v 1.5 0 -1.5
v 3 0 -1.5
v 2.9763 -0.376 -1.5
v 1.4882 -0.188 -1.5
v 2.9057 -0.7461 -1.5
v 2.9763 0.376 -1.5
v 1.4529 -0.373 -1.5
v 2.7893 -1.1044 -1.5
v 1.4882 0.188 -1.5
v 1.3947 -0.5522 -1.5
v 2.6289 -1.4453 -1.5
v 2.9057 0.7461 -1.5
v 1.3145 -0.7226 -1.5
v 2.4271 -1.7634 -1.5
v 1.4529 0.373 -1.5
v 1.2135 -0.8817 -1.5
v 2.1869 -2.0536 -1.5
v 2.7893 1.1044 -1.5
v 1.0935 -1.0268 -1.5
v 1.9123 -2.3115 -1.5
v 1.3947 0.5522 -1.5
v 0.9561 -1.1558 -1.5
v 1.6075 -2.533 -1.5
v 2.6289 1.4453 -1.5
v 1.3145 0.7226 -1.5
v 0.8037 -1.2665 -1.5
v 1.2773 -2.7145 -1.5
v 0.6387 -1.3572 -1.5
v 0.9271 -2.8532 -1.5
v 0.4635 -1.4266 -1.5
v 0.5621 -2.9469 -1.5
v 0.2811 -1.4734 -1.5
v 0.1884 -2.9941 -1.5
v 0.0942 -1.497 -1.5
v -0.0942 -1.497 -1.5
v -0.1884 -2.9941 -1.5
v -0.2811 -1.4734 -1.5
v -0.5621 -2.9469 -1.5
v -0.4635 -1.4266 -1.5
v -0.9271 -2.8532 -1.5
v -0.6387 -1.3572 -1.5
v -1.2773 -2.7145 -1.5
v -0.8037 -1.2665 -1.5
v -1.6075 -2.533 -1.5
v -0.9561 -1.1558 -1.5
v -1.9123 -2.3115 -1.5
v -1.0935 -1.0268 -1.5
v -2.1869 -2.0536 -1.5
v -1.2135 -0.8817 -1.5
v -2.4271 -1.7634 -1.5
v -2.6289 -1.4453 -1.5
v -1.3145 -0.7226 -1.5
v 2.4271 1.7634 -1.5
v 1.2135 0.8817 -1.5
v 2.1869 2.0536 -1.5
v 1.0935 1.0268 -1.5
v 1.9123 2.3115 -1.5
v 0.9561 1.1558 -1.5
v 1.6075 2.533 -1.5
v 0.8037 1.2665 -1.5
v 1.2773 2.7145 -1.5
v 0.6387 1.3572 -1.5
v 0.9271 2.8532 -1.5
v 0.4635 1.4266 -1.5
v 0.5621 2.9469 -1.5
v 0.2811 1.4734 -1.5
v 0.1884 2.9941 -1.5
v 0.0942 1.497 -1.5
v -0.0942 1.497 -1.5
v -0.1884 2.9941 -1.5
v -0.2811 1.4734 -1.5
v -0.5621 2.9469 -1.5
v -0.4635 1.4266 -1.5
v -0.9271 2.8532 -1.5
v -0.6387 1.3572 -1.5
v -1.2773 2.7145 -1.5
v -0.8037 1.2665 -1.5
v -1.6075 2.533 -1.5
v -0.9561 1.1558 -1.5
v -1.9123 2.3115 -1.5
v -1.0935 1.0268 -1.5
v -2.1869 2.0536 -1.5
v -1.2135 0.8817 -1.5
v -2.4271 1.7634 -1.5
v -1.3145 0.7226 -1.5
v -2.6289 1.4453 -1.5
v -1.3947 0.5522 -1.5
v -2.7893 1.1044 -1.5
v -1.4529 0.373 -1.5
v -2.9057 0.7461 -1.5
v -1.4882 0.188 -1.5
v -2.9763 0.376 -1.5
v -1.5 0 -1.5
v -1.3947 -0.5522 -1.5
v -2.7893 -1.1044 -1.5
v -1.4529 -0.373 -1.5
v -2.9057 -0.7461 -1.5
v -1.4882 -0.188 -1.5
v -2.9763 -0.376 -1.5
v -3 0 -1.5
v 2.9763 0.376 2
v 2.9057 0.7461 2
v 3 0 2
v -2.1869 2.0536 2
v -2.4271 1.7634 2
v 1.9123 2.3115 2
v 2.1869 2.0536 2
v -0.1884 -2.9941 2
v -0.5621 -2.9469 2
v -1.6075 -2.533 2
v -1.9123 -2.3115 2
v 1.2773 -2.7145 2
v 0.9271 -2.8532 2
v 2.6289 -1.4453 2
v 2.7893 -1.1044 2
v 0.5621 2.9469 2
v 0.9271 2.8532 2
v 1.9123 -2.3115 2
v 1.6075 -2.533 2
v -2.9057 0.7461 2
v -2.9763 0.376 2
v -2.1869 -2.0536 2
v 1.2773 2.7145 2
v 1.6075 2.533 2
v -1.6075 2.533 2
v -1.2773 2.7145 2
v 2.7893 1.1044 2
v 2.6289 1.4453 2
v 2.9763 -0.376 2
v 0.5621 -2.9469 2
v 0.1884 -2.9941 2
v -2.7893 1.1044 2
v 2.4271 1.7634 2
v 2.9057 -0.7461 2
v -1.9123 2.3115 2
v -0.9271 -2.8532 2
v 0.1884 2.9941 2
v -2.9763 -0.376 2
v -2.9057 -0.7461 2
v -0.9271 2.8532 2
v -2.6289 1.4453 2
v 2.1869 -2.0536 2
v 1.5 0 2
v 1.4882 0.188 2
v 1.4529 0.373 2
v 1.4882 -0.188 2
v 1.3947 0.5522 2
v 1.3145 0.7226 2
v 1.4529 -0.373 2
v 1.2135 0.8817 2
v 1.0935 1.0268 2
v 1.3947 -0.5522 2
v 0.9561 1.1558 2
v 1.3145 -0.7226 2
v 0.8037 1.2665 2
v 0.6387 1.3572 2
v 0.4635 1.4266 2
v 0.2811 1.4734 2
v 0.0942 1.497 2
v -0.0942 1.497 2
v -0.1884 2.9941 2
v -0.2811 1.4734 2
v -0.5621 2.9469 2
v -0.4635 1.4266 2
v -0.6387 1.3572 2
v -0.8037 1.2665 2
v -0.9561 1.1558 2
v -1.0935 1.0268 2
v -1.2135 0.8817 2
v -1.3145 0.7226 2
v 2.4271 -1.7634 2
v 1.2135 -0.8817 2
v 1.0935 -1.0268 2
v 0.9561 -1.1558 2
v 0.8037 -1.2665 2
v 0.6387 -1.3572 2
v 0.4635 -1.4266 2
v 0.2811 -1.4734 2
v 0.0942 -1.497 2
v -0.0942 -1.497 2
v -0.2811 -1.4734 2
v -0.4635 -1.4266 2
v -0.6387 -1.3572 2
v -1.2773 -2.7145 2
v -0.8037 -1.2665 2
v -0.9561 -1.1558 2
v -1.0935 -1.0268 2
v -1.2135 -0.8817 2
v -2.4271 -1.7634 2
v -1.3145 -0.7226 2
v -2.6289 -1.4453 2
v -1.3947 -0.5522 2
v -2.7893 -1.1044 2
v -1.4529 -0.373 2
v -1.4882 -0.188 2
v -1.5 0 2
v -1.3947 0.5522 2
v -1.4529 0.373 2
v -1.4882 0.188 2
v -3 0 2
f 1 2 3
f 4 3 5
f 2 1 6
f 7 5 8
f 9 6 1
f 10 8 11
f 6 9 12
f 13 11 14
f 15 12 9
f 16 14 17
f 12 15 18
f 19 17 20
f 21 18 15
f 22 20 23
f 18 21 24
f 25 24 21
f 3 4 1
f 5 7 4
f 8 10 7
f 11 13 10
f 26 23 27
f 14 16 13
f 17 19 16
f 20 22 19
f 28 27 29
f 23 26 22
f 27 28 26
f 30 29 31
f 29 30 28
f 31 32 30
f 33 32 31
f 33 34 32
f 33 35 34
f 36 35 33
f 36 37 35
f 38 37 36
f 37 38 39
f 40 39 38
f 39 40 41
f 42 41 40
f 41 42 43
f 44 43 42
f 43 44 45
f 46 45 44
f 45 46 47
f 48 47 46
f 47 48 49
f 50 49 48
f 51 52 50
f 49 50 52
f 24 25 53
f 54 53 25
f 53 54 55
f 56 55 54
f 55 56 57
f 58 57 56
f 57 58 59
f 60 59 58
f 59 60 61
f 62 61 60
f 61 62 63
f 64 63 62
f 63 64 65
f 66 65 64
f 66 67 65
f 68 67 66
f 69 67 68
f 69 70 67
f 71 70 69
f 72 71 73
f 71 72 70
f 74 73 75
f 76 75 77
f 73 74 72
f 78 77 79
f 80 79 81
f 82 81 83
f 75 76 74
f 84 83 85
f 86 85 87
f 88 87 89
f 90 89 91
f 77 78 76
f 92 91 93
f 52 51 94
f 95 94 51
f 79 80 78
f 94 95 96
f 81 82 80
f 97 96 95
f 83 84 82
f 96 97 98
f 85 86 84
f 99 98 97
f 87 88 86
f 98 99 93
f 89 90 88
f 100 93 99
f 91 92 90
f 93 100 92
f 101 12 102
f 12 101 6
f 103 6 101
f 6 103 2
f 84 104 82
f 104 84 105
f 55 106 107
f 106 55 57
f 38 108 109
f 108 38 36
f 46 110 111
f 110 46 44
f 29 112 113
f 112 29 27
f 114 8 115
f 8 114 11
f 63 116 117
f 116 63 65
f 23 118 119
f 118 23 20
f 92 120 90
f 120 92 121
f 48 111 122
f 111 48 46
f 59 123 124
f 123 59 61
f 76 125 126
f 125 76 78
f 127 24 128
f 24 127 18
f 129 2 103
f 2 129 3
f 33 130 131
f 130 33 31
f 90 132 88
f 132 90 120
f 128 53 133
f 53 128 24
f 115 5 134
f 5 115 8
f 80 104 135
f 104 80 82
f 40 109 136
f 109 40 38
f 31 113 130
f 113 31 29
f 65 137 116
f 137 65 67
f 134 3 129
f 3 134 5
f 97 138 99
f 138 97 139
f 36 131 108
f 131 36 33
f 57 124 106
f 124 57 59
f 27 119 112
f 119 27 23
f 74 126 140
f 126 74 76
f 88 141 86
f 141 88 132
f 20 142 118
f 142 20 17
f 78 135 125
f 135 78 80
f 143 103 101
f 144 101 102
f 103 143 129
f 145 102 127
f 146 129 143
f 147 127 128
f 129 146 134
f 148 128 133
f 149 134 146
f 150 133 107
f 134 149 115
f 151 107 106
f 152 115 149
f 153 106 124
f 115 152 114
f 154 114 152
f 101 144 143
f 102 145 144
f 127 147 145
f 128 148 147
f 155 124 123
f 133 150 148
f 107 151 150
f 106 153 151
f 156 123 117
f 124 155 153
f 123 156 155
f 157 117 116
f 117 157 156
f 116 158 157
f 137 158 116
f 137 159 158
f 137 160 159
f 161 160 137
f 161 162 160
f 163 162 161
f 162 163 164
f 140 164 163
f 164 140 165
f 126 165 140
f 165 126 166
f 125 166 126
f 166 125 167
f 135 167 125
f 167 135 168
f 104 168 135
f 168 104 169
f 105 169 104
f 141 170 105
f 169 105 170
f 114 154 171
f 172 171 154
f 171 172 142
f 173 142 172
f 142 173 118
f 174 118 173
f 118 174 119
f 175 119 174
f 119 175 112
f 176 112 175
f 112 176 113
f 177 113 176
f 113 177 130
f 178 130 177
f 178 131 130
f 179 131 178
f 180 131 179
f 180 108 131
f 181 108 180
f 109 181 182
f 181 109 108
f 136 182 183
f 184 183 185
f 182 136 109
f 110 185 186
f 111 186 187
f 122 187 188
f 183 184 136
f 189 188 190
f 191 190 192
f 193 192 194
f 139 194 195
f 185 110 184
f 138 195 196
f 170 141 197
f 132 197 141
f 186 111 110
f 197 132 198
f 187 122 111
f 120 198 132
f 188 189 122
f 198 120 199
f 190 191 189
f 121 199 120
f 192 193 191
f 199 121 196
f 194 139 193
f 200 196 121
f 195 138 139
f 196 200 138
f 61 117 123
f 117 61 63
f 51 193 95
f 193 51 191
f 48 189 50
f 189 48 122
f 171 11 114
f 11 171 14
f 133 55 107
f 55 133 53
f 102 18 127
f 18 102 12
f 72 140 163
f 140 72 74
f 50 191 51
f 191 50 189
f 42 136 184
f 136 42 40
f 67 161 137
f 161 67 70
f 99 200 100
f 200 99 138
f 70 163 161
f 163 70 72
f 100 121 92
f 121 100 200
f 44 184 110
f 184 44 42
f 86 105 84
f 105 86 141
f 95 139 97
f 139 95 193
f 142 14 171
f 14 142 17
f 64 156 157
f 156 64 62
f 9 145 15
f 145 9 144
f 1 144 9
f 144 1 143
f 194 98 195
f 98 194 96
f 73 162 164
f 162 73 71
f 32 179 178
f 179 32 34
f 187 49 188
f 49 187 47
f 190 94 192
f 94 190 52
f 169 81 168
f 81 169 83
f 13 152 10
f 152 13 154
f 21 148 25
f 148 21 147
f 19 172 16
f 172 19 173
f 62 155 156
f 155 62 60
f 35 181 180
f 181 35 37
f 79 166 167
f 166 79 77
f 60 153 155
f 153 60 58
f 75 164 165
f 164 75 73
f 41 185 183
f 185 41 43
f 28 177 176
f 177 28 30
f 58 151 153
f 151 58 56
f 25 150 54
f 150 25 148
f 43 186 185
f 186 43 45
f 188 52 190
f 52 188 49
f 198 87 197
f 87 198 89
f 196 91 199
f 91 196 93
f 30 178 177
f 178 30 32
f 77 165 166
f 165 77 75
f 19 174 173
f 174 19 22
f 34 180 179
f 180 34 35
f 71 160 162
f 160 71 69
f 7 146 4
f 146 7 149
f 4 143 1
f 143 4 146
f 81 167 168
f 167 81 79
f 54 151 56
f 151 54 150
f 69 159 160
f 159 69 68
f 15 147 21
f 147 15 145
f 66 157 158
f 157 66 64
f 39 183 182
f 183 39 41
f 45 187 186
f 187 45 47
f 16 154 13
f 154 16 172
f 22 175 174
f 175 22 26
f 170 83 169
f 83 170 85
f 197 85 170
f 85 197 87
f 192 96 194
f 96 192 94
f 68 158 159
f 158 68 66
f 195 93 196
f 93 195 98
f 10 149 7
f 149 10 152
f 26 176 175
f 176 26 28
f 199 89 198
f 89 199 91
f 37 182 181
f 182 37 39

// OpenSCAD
$fn = 50;


difference() {
	union() {
		translate(v = [0, 0, -1.5000000000]) {
			cylinder(h = 3, r = 1.0000000000);
		}
		translate(v = [0, 0, -1.5000000000]) {
			cylinder(h = 3.5000000000, r = 3.0000000000);
		}
	}
	union() {
		translate(v = [0, 0, -50.0000000000]) {
			cylinder(h = 100, r = 1.5000000000);
		}
	}
}
